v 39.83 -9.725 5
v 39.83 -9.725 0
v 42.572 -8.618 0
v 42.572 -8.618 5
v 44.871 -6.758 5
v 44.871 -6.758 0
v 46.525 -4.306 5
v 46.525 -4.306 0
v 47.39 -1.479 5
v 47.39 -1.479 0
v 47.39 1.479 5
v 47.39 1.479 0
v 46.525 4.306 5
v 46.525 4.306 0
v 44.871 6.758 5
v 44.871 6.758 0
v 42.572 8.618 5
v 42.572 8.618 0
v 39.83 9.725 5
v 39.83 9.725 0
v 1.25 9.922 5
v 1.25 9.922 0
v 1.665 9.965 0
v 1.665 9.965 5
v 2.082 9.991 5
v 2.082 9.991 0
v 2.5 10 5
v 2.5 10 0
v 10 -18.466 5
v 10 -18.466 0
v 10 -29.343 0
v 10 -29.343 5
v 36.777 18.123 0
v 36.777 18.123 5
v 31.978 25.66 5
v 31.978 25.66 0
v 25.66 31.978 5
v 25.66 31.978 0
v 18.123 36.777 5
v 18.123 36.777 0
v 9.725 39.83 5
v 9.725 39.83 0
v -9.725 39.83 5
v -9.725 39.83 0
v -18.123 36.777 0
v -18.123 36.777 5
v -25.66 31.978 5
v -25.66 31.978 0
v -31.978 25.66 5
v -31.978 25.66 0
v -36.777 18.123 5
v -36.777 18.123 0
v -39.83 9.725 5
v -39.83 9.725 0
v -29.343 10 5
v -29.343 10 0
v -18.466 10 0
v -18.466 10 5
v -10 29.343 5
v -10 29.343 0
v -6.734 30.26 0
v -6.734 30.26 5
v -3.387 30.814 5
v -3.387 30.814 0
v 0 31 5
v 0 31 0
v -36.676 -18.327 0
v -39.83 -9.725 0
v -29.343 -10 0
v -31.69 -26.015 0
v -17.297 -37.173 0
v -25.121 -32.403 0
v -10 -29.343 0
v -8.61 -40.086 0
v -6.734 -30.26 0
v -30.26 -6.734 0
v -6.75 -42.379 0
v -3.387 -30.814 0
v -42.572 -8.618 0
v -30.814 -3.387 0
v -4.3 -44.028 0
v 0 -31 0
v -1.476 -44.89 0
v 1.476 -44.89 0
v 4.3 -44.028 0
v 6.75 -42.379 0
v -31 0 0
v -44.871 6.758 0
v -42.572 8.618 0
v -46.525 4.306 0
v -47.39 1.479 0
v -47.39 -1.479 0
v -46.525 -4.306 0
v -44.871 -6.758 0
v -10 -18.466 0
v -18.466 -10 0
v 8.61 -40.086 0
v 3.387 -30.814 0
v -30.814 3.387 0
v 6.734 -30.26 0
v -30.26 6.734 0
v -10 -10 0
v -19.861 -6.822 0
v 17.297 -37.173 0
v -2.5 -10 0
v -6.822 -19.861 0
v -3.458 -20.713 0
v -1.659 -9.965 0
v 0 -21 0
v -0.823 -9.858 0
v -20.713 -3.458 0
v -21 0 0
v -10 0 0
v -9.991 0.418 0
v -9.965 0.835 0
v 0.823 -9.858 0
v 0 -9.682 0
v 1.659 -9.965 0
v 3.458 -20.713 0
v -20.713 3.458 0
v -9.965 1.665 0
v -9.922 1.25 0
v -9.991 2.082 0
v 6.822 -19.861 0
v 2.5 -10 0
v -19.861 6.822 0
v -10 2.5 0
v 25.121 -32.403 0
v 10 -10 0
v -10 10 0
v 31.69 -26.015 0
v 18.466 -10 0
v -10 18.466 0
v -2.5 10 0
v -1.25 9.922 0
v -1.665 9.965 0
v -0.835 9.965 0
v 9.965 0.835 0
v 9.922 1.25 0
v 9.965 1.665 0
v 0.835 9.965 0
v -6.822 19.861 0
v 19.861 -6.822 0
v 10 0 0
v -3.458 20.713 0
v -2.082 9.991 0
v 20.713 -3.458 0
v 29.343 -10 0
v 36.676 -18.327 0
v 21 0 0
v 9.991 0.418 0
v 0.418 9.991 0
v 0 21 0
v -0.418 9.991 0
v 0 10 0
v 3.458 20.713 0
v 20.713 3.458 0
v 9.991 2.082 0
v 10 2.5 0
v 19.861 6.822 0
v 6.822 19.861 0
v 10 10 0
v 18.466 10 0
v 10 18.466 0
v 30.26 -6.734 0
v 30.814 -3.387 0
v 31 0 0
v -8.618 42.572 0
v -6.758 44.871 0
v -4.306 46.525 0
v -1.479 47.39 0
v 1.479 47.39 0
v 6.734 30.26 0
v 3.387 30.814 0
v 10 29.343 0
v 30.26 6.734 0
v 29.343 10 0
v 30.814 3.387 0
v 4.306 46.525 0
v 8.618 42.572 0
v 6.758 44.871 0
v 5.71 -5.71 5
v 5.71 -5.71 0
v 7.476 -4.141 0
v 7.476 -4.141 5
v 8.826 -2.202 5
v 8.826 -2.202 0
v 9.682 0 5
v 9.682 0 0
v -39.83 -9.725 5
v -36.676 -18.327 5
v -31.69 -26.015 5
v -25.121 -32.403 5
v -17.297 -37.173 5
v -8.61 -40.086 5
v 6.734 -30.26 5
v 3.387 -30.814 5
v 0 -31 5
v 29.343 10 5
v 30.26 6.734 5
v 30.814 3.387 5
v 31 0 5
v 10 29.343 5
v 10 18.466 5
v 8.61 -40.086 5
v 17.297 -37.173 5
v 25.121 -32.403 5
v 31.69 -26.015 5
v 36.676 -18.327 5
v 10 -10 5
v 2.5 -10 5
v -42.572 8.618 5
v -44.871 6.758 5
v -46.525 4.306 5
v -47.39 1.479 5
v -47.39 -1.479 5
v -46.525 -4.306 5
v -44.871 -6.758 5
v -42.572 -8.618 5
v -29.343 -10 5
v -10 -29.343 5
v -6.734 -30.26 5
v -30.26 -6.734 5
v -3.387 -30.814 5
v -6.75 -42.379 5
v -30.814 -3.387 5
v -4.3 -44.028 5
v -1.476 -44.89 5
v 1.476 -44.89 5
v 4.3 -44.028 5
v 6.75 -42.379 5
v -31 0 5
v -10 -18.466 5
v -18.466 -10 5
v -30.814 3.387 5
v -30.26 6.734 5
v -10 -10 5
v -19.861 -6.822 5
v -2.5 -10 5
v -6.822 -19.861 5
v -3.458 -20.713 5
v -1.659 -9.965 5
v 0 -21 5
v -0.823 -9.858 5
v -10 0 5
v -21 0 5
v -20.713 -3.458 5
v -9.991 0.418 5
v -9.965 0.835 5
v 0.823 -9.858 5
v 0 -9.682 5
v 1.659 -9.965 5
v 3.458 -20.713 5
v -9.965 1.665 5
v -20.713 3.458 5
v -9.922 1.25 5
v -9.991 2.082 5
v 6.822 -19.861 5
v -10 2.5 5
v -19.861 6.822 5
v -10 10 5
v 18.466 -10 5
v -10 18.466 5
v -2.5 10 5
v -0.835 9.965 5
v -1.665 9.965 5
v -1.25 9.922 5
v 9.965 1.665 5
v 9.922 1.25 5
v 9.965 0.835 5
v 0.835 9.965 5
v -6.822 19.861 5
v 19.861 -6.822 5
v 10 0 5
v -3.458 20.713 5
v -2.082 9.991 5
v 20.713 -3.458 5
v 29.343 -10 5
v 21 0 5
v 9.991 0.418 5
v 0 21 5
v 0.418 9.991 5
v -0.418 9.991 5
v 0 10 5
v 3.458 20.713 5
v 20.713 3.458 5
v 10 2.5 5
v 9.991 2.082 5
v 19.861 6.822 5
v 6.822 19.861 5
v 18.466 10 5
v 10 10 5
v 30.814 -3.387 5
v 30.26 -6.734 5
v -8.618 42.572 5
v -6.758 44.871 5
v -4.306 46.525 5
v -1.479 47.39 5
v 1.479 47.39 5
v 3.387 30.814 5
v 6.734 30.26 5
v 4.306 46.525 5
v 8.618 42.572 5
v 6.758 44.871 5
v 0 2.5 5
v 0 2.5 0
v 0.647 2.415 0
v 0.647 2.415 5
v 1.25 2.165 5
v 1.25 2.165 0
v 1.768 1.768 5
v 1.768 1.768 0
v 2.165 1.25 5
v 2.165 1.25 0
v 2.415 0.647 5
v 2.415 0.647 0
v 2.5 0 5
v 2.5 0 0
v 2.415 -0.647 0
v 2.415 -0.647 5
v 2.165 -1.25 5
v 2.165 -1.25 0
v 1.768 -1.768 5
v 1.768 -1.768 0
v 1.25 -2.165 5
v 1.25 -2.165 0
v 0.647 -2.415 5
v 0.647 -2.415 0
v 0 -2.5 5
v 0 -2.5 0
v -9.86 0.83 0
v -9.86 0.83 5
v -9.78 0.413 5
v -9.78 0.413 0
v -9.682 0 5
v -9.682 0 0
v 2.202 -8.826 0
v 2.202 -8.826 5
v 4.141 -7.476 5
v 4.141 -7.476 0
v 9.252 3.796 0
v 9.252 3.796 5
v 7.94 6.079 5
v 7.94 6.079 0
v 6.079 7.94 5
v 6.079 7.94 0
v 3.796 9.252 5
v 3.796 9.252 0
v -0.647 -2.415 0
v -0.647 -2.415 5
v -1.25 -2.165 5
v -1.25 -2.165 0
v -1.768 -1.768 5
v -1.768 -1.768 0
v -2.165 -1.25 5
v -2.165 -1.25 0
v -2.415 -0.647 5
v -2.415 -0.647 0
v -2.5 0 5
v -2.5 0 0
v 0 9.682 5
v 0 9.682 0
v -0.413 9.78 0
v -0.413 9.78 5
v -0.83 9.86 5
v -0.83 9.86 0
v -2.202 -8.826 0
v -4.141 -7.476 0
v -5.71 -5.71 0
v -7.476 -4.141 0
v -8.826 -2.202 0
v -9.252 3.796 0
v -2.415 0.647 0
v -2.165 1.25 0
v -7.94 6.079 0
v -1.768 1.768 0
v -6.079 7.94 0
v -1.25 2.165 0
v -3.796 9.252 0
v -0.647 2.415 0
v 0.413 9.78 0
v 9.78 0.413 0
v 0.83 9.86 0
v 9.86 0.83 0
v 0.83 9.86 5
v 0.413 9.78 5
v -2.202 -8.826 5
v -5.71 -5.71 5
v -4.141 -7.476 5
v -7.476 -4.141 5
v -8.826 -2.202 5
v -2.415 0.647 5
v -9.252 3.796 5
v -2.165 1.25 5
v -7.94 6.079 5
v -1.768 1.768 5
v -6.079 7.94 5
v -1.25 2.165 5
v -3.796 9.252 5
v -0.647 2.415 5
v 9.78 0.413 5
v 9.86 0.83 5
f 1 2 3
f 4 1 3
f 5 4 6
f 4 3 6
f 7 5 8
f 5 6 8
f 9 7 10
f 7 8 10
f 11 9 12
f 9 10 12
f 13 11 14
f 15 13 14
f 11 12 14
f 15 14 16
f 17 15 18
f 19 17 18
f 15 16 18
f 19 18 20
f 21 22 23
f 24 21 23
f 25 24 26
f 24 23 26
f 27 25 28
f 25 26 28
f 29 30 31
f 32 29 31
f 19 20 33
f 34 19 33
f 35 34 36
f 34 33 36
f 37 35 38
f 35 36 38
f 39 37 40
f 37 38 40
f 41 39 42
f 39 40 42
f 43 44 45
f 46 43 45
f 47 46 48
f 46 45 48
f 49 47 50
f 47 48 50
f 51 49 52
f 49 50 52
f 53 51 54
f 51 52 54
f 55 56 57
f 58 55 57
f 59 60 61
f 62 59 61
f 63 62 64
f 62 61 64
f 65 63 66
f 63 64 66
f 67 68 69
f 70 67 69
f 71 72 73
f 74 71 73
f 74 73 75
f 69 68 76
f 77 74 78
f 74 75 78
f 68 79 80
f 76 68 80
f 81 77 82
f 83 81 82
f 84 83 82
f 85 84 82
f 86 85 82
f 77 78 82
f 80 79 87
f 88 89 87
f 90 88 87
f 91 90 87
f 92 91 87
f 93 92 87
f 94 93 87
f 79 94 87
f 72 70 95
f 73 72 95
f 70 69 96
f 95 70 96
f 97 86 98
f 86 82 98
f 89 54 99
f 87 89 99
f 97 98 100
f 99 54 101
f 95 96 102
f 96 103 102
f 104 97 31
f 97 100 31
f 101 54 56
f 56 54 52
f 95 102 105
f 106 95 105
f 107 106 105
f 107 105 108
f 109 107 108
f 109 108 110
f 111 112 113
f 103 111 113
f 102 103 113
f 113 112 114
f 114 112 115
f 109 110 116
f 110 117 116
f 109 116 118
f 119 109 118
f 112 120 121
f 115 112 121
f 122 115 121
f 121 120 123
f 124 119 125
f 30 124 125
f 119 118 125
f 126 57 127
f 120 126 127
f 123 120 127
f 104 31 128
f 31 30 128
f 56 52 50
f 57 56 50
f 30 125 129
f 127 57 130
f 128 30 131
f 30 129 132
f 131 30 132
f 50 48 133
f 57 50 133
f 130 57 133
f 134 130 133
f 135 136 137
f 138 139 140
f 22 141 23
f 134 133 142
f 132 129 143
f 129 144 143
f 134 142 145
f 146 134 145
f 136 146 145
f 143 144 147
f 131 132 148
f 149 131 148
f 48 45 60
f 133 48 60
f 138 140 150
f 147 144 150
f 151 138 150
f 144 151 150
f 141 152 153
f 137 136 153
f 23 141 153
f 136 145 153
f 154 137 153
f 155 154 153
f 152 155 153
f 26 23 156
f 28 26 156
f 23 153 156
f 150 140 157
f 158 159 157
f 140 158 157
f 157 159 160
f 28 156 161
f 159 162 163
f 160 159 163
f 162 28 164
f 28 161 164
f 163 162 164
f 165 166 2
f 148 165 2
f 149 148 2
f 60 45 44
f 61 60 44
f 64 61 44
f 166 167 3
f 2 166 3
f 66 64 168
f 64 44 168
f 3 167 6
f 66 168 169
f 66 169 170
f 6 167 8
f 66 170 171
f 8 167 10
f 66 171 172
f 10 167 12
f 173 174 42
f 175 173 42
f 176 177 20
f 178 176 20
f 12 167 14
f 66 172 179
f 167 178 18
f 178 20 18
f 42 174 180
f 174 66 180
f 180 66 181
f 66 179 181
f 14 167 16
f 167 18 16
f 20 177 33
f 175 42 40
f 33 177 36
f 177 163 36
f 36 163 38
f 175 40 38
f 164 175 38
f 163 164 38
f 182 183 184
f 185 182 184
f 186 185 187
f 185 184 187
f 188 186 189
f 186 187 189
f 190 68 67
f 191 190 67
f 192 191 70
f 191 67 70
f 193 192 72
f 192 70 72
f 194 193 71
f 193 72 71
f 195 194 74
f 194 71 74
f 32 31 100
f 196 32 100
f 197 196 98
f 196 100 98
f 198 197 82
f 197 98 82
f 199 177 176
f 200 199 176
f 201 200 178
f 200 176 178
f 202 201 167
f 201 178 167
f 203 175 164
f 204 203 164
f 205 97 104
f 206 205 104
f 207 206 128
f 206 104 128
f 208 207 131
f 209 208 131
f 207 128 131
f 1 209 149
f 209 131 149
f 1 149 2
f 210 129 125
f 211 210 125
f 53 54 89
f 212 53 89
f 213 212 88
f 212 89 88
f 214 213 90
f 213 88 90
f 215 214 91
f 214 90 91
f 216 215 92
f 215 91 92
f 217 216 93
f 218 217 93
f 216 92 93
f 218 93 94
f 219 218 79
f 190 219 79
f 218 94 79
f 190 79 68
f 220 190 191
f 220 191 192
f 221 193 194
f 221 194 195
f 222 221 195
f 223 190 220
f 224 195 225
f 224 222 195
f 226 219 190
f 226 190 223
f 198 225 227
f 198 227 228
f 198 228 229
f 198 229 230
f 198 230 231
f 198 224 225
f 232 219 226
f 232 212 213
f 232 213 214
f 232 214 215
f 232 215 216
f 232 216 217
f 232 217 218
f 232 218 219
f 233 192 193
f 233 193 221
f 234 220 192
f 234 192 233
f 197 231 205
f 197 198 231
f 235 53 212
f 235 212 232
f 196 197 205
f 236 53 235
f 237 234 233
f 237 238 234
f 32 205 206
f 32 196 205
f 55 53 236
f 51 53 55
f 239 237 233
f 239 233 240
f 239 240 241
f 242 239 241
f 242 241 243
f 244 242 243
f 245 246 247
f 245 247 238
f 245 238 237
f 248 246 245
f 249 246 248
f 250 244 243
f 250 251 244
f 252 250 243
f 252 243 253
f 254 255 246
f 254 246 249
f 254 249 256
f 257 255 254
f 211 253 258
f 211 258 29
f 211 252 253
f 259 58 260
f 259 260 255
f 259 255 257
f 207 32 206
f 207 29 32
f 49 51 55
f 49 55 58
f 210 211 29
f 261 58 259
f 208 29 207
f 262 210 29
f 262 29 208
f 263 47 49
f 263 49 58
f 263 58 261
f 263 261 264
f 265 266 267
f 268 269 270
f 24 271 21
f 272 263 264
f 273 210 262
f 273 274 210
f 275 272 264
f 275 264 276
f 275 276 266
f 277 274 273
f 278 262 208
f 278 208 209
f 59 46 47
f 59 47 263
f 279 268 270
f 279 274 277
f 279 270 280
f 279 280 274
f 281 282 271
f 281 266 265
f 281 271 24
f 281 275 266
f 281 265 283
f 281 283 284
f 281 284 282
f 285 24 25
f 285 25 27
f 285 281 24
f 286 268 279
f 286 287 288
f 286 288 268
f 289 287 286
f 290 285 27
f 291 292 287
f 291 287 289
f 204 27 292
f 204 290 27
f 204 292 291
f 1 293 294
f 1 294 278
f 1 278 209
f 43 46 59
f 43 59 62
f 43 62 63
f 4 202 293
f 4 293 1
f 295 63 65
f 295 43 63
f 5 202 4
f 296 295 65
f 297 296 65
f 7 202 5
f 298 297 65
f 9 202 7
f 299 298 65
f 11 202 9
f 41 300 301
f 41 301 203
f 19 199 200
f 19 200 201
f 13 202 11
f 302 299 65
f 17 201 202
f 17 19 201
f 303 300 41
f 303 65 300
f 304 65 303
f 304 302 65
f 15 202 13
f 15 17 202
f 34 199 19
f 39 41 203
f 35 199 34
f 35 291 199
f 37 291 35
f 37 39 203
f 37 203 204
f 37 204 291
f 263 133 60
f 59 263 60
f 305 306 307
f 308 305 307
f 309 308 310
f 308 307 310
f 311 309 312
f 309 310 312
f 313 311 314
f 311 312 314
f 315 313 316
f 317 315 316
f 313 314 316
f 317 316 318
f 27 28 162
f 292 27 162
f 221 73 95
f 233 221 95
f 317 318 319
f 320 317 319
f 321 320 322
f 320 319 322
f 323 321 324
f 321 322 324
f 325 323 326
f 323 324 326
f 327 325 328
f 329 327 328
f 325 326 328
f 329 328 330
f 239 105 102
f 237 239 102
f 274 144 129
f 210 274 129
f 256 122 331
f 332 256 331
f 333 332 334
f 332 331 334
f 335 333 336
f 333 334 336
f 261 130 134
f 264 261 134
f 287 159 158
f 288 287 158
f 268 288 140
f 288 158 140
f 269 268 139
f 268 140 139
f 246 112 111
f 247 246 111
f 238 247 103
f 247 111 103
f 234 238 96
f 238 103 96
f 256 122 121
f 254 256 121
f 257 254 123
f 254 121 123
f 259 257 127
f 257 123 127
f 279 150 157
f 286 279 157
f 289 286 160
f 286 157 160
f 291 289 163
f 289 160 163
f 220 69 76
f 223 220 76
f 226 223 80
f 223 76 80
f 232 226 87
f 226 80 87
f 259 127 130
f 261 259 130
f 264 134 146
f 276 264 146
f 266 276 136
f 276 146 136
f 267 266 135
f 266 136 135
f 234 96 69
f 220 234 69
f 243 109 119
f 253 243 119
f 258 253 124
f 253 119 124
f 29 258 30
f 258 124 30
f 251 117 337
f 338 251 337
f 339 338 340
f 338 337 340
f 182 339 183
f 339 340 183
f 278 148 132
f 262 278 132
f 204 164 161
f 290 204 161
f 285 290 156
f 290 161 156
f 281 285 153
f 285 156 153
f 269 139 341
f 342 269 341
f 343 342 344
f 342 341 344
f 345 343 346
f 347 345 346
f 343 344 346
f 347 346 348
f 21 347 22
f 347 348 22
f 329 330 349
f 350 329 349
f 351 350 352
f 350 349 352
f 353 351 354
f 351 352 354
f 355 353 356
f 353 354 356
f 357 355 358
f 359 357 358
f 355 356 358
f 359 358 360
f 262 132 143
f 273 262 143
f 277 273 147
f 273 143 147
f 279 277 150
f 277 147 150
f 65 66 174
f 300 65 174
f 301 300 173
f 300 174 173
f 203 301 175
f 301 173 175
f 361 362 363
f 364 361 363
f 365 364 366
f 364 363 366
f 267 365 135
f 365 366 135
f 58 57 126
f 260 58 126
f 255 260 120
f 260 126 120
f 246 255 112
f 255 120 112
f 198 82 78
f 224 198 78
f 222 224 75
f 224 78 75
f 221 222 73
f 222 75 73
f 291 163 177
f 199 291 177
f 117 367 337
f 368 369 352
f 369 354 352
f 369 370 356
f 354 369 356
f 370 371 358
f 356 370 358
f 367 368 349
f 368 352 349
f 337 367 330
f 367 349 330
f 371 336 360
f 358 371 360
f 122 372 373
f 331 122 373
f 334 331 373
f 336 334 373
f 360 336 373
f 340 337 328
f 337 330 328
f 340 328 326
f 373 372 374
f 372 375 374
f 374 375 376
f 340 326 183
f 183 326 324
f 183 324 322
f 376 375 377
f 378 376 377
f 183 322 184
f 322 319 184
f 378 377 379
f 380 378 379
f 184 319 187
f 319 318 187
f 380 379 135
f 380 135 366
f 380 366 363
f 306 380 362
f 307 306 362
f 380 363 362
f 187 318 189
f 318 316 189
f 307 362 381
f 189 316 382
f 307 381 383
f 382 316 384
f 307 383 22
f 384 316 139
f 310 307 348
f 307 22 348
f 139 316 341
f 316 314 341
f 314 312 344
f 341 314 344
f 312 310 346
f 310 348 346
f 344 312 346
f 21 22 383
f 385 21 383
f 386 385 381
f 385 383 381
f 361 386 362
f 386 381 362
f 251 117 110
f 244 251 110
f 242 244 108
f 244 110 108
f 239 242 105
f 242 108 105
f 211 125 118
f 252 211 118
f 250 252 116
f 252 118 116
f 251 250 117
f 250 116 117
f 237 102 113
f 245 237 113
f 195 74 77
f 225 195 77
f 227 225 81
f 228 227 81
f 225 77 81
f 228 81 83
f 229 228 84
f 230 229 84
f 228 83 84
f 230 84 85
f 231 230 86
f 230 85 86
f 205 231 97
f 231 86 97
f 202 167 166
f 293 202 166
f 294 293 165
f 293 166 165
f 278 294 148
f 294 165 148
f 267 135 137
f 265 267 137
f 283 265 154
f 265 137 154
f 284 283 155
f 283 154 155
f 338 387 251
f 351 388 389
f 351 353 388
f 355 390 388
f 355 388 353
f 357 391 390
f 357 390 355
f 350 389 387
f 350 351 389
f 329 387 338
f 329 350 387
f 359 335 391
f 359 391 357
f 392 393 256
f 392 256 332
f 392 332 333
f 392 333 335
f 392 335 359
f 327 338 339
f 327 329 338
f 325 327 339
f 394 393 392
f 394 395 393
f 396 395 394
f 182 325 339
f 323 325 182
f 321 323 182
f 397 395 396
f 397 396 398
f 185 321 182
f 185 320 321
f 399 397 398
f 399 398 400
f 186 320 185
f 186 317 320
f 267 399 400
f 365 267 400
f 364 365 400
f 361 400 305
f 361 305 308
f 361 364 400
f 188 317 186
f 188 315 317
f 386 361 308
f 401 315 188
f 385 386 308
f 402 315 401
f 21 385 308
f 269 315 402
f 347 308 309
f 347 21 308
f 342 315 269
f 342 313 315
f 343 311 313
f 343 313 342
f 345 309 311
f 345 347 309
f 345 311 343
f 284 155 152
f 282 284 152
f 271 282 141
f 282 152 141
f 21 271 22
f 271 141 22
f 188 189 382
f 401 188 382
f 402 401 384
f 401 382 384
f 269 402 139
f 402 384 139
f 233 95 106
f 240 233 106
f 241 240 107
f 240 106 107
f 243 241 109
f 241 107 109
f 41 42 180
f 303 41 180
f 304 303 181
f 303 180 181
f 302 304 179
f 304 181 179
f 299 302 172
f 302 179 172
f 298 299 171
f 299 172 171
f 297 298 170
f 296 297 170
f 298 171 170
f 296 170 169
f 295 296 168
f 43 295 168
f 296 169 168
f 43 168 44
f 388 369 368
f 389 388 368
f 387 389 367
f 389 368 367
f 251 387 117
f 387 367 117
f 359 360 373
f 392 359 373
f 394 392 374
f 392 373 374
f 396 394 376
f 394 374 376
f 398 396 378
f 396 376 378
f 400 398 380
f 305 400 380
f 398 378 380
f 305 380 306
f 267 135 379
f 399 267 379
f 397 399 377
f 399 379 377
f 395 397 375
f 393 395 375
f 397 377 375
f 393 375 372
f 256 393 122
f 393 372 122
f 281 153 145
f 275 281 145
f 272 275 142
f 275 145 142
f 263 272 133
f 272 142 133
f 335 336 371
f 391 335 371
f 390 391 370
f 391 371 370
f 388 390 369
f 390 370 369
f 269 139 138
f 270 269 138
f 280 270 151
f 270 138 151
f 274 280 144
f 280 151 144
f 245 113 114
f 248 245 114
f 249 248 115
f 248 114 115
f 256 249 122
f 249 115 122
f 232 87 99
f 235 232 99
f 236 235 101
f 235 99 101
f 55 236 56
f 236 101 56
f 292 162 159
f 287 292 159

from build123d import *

# Parameters (mm, degrees)
F1_DEPTH = 5


with BuildPart() as f1:
    # F0 (on Top) → F1 (new body)
    with BuildSketch(Plane.XY):
        with BuildLine():
            ThreePointArc((-10, 29.3428015022), (-5.0681926478, 30.5828942921), (0, 31))
            ThreePointArc((0, 31), (5.0681926478, 30.5828942921), (10, 29.3428015022))
            Line((10, 29.3428015022), (10, 37.5))
            ThreePointArc((10, 37.5), (9.9309534662, 38.6730998478), (9.7247673494, 39.83))
            ThreePointArc((9.7247673494, 39.83), (0, 41), (-9.7247673494, 39.83))
            ThreePointArc((-9.7247673494, 39.83), (-9.9309534662, 38.6730998478), (-10, 37.5))
            Line((-10, 37.5), (-10, 29.3428015022))
        make_face()
        with BuildLine():
            ThreePointArc((10, -29.3428015022), (5.0681926478, -30.5828942921), (0, -31))
            ThreePointArc((0, -31), (-5.0681926478, -30.5828942921), (-10, -29.3428015022))
            Line((-10, -29.3428015022), (-10, -35))
            ThreePointArc((-10, -35), (-9.6462941162, -37.6360974611), (-8.6101980351, -40.0857142857))
            ThreePointArc((-8.6101980351, -40.0857142857), (0, -41), (8.6101980351, -40.0857142857))
            ThreePointArc((8.6101980351, -40.0857142857), (9.6462941162, -37.6360974611), (10, -35))
            Line((10, -35), (10, -29.3428015022))
        make_face()
        with BuildLine():
            ThreePointArc((29.3428015022, 10), (30.5828942921, 5.0681926478), (31, 0))
            ThreePointArc((31, 0), (30.5828942921, -5.0681926478), (29.3428015022, -10))
            Line((29.3428015022, -10), (37.5, -10))
            ThreePointArc((37.5, -10), (38.6730998478, -9.9309534662), (39.83, -9.7247673494))
            ThreePointArc((39.83, -9.7247673494), (40.7064491205, -4.8974483152), (41, 0))
            ThreePointArc((41, 0), (40.7064491205, 4.8974483152), (39.83, 9.7247673494))
            ThreePointArc((39.83, 9.7247673494), (38.6730998478, 9.9309534662), (37.5, 10))
            Line((37.5, 10), (29.3428015022, 10))
        make_face()
        with BuildLine():
            Line((10, 37.5), (10, 29.3428015022))
            ThreePointArc((10, 29.3428015022), (21.9203102168, 21.9203102168), (29.3428015022, 10))
            Line((29.3428015022, 10), (37.5, 10))
            ThreePointArc((37.5, 10), (38.6730998478, 9.9309534662), (39.83, 9.7247673494))
            ThreePointArc((39.83, 9.7247673494), (28.9913780286, 28.9913780286), (9.7247673494, 39.83))
            ThreePointArc((9.7247673494, 39.83), (9.9309534662, 38.6730998478), (10, 37.5))
        make_face()
        with BuildLine():
            ThreePointArc((-29.3428015022, 10), (-21.9203102168, 21.9203102168), (-10, 29.3428015022))
            Line((-10, 29.3428015022), (-10, 37.5))
            ThreePointArc((-10, 37.5), (-9.9309534662, 38.6730998478), (-9.7247673494, 39.83))
            ThreePointArc((-9.7247673494, 39.83), (-28.9913780286, 28.9913780286), (-39.83, 9.7247673494))
            ThreePointArc((-39.83, 9.7247673494), (-38.6730998478, 9.9309534662), (-37.5, 10))
            Line((-37.5, 10), (-29.3428015022, 10))
        make_face()
        with BuildLine():
            Line((-10, -35), (-10, -29.3428015022))
            ThreePointArc((-10, -29.3428015022), (-21.9203102168, -21.9203102168), (-29.3428015022, -10))
            Line((-29.3428015022, -10), (-37.5, -10))
            ThreePointArc((-37.5, -10), (-38.6730998478, -9.9309534662), (-39.83, -9.7247673494))
            ThreePointArc((-39.83, -9.7247673494), (-28.5842608989, -29.3928567659), (-8.6101980351, -40.0857142857))
            ThreePointArc((-8.6101980351, -40.0857142857), (-9.6462941162, -37.6360974611), (-10, -35))
        make_face()
        with BuildLine():
            ThreePointArc((29.3428015022, -10), (21.9203102168, -21.9203102168), (10, -29.3428015022))
            Line((10, -29.3428015022), (10, -35))
            ThreePointArc((10, -35), (9.6462941162, -37.6360974611), (8.6101980351, -40.0857142857))
            ThreePointArc((8.6101980351, -40.0857142857), (28.5842608989, -29.3928567659), (39.83, -9.7247673494))
            ThreePointArc((39.83, -9.7247673494), (38.6730998478, -9.9309534662), (37.5, -10))
            Line((37.5, -10), (29.3428015022, -10))
        make_face()
        with BuildLine():
            ThreePointArc((-29.3428015022, -10), (-30.5828942921, -5.0681926478), (-31, 0))
            ThreePointArc((-31, 0), (-30.5828942921, 5.0681926478), (-29.3428015022, 10))
            Line((-29.3428015022, 10), (-37.5, 10))
            ThreePointArc((-37.5, 10), (-38.6730998478, 9.9309534662), (-39.83, 9.7247673494))
            ThreePointArc((-39.83, 9.7247673494), (-41, 0), (-39.83, -9.7247673494))
            ThreePointArc((-39.83, -9.7247673494), (-38.6730998478, -9.9309534662), (-37.5, -10))
            Line((-37.5, -10), (-29.3428015022, -10))
        make_face()
        with BuildLine():
            ThreePointArc((-9.7247673494, 39.83), (0, 41), (9.7247673494, 39.83))
            ThreePointArc((9.7247673494, 39.83), (0, 47.5), (-9.7247673494, 39.83))
        make_face()
        with BuildLine():
            ThreePointArc((8.6101980351, -40.0857142857), (0, -41), (-8.6101980351, -40.0857142857))
            ThreePointArc((-8.6101980351, -40.0857142857), (0, -45), (8.6101980351, -40.0857142857))
        make_face()
        with BuildLine():
            ThreePointArc((39.83, -9.7247673494), (47.5, 0), (39.83, 9.7247673494))
            ThreePointArc((39.83, 9.7247673494), (40.7064491205, 4.8974483152), (41, 0))
            ThreePointArc((41, 0), (40.7064491205, -4.8974483152), (39.83, -9.7247673494))
        make_face()
        with BuildLine():
            ThreePointArc((-39.83, -9.7247673494), (-41, 0), (-39.83, 9.7247673494))
            ThreePointArc((-39.83, 9.7247673494), (-47.5, 0), (-39.83, -9.7247673494))
        make_face()
        with BuildLine():
            ThreePointArc((18.4661853126, -10), (14.8492424049, -14.8492424049), (10, -18.4661853126))
            Line((10, -18.4661853126), (10, -29.3428015022))
            ThreePointArc((10, -29.3428015022), (21.9203102168, -21.9203102168), (29.3428015022, -10))
            Line((29.3428015022, -10), (18.4661853126, -10))
        make_face()
        with BuildLine():
            Line((10, 29.3428015022), (10, 18.4661853126))
            ThreePointArc((10, 18.4661853126), (14.8492424049, 14.8492424049), (18.4661853126, 10))
            Line((18.4661853126, 10), (29.3428015022, 10))
            ThreePointArc((29.3428015022, 10), (21.9203102168, 21.9203102168), (10, 29.3428015022))
        make_face()
        with BuildLine():
            ThreePointArc((-18.4661853126, 10), (-14.8492424049, 14.8492424049), (-10, 18.4661853126))
            Line((-10, 18.4661853126), (-10, 29.3428015022))
            ThreePointArc((-10, 29.3428015022), (-21.9203102168, 21.9203102168), (-29.3428015022, 10))
            Line((-29.3428015022, 10), (-18.4661853126, 10))
        make_face()
        with BuildLine():
            Line((-10, -29.3428015022), (-10, -18.4661853126))
            ThreePointArc((-10, -18.4661853126), (-14.8492424049, -14.8492424049), (-18.4661853126, -10))
            Line((-18.4661853126, -10), (-29.3428015022, -10))
            ThreePointArc((-29.3428015022, -10), (-21.9203102168, -21.9203102168), (-10, -29.3428015022))
        make_face()
        with BuildLine():
            Line((18.4661853126, -10), (10, -10))
            Line((10, -10), (10, -18.4661853126))
            ThreePointArc((10, -18.4661853126), (14.8492424049, -14.8492424049), (18.4661853126, -10))
        make_face()
        with BuildLine():
            ThreePointArc((-18.4661853126, -10), (-14.8492424049, -14.8492424049), (-10, -18.4661853126))
            Line((-10, -18.4661853126), (-10, -10))
            Line((-10, -10), (-18.4661853126, -10))
        make_face()
        with BuildLine():
            Line((0, -21), (0, -9.6824583655))
            ThreePointArc((0, -9.6824583655), (-1.2399570752, -9.9202969627), (-2.5, -10))
            Line((-2.5, -10), (-10, -10))
            Line((-10, -10), (-10, -18.4661853126))
            ThreePointArc((-10, -18.4661853126), (-5.1580087454, -20.356692899), (0, -21))
        make_face()
        with BuildLine():
            ThreePointArc((2.5, -10), (1.2399570752, -9.9202969627), (0, -9.6824583655))
            Line((0, -9.6824583655), (0, -21))
            ThreePointArc((0, -21), (5.1580087454, -20.356692899), (10, -18.4661853126))
            Line((10, -18.4661853126), (10, -10))
            Line((10, -10), (2.5, -10))
        make_face()
        with BuildLine():
            ThreePointArc((18.4661853126, 10), (14.8492424049, 14.8492424049), (10, 18.4661853126))
            Line((10, 18.4661853126), (10, 10))
            Line((10, 10), (18.4661853126, 10))
        make_face()
        with BuildLine():
            ThreePointArc((9.9215674165, 1.25), (9.9803725924, 0.6262291254), (10, 0))
            Line((10, 0), (21, 0))
            ThreePointArc((21, 0), (20.356692899, 5.1580087454), (18.4661853126, 10))
            Line((18.4661853126, 10), (10, 10))
            Line((10, 10), (10, 2.5))
            ThreePointArc((10, 2.5), (9.9803725924, 1.8737708746), (9.9215674165, 1.25))
        make_face()
        with BuildLine():
            Line((21, 0), (10, 0))
            Line((10, 0), (10, -10))
            Line((10, -10), (18.4661853126, -10))
            ThreePointArc((18.4661853126, -10), (20.356692899, -5.1580087454), (21, 0))
        make_face()
        with BuildLine():
            Line((-10, 10), (-10, 18.4661853126))
            ThreePointArc((-10, 18.4661853126), (-14.8492424049, 14.8492424049), (-18.4661853126, 10))
            Line((-18.4661853126, 10), (-10, 10))
        make_face()
        with BuildLine():
            ThreePointArc((-1.25, 9.9215674165), (-0.6262291254, 9.9803725924), (0, 10))
            Line((0, 10), (0, 21))
            ThreePointArc((0, 21), (-5.1580087454, 20.356692899), (-10, 18.4661853126))
            Line((-10, 18.4661853126), (-10, 10))
            Line((-10, 10), (-2.5, 10))
            ThreePointArc((-2.5, 10), (-1.8737708746, 9.9803725924), (-1.25, 9.9215674165))
        make_face()
        with BuildLine():
            Line((0, 21), (0, 10))
            ThreePointArc((0, 10), (0.6262291254, 9.9803725924), (1.25, 9.9215674165))
            ThreePointArc((1.25, 9.9215674165), (1.8737708746, 9.9803725924), (2.5, 10))
            Line((2.5, 10), (10, 10))
            Line((10, 10), (10, 18.4661853126))
            ThreePointArc((10, 18.4661853126), (5.1580087454, 20.356692899), (0, 21))
        make_face()
        with BuildLine():
            ThreePointArc((-10, 0), (-9.9803725924, 0.6262291254), (-9.9215674165, 1.25))
            ThreePointArc((-9.9215674165, 1.25), (-9.9803725924, 1.8737708746), (-10, 2.5))
            Line((-10, 2.5), (-10, 10))
            Line((-10, 10), (-18.4661853126, 10))
            ThreePointArc((-18.4661853126, 10), (-20.356692899, 5.1580087454), (-21, 0))
            Line((-21, 0), (-10, 0))
        make_face()
        with BuildLine():
            Line((-10, -10), (-10, 0))
            Line((-10, 0), (-21, 0))
            ThreePointArc((-21, 0), (-20.356692899, -5.1580087454), (-18.4661853126, -10))
            Line((-18.4661853126, -10), (-10, -10))
        make_face()
    extrude(amount=F1_DEPTH)


with BuildPart() as f1b:
    # F0 (on Top) → F1, piece 2 (new body)
    with BuildSketch(Plane.XY):
        with BuildLine():
            ThreePointArc((-7.5, 0), (-5.4056941504, 6.123724357), (0, 9.6824583655))
            ThreePointArc((0, 9.6824583655), (-0.6211923237, 9.8219184336), (-1.25, 9.9215674165))
            ThreePointArc((-1.25, 9.9215674165), (-7.0710678119, 7.0710678119), (-9.9215674165, 1.25))
            ThreePointArc((-9.9215674165, 1.25), (-9.8219184336, 0.6211923237), (-9.6824583655, 0))
            Line((-9.6824583655, 0), (-7.5, 0))
        make_face()
        with BuildLine():
            ThreePointArc((0, 9.6824583655), (5.4056941504, 6.123724357), (7.5, 0))
            Line((7.5, 0), (9.6824583655, 0))
            ThreePointArc((9.6824583655, 0), (9.8219184336, 0.6211923237), (9.9215674165, 1.25))
            ThreePointArc((9.9215674165, 1.25), (7.0710678119, 7.0710678119), (1.25, 9.9215674165))
            ThreePointArc((1.25, 9.9215674165), (0.6211923237, 9.8219184336), (0, 9.6824583655))
        make_face()
        with BuildLine():
            Line((9.6824583655, 0), (7.5, 0))
            ThreePointArc((7.5, 0), (7.0419351951, -2.9919011903), (5.7097054535, -5.7097054535))
            ThreePointArc((5.7097054535, -5.7097054535), (8.2085236705, -3.2114043063), (9.6824583655, 0))
        make_face()
        with BuildLine():
            Line((7.5, 0), (2.5, 0))
            ThreePointArc((2.5, 0), (1.767766953, -1.767766953), (0, -2.5))
            Line((0, -2.5), (0, -7.5))
            ThreePointArc((0, -7.5), (2.9919011903, -7.0419351951), (5.7097054535, -5.7097054535))
            ThreePointArc((5.7097054535, -5.7097054535), (7.0419351951, -2.9919011903), (7.5, 0))
        make_face()
        with BuildLine():
            Line((0, -7.5), (0, -2.5))
            ThreePointArc((0, -2.5), (-1.767766953, -1.767766953), (-2.5, 0))
            Line((-2.5, 0), (-7.5, 0))
            ThreePointArc((-7.5, 0), (-7.0419351951, -2.9919011903), (-5.7097054535, -5.7097054535))
            ThreePointArc((-5.7097054535, -5.7097054535), (-2.9919011903, -7.0419351951), (0, -7.5))
        make_face()
        with BuildLine():
            ThreePointArc((-5.7097054535, -5.7097054535), (-7.0419351951, -2.9919011903), (-7.5, 0))
            Line((-7.5, 0), (-9.6824583655, 0))
            ThreePointArc((-9.6824583655, 0), (-8.2085236705, -3.2114043063), (-5.7097054535, -5.7097054535))
        make_face()
        with BuildLine():
            Line((0, -9.6824583655), (0, -7.5))
            ThreePointArc((0, -7.5), (-2.9919011903, -7.0419351951), (-5.7097054535, -5.7097054535))
            ThreePointArc((-5.7097054535, -5.7097054535), (-3.2114043063, -8.2085236705), (0, -9.6824583655))
        make_face()
        with BuildLine():
            ThreePointArc((5.7097054535, -5.7097054535), (2.9919011903, -7.0419351951), (0, -7.5))
            Line((0, -7.5), (0, -9.6824583655))
            ThreePointArc((0, -9.6824583655), (3.2114043063, -8.2085236705), (5.7097054535, -5.7097054535))
        make_face()
        with BuildLine():
            ThreePointArc((0, 2.5), (1.767766953, 1.767766953), (2.5, 0))
            Line((2.5, 0), (7.5, 0))
            ThreePointArc((7.5, 0), (5.4056941504, 6.123724357), (0, 9.6824583655))
            Line((0, 9.6824583655), (0, 2.5))
        make_face()
        with BuildLine():
            ThreePointArc((-2.5, 0), (-1.767766953, 1.767766953), (0, 2.5))
            Line((0, 2.5), (0, 9.6824583655))
            ThreePointArc((0, 9.6824583655), (-5.4056941504, 6.123724357), (-7.5, 0))
            Line((-7.5, 0), (-2.5, 0))
        make_face()
    extrude(amount=F1_DEPTH)


solid = Compound([f1.part, f1b.part])
